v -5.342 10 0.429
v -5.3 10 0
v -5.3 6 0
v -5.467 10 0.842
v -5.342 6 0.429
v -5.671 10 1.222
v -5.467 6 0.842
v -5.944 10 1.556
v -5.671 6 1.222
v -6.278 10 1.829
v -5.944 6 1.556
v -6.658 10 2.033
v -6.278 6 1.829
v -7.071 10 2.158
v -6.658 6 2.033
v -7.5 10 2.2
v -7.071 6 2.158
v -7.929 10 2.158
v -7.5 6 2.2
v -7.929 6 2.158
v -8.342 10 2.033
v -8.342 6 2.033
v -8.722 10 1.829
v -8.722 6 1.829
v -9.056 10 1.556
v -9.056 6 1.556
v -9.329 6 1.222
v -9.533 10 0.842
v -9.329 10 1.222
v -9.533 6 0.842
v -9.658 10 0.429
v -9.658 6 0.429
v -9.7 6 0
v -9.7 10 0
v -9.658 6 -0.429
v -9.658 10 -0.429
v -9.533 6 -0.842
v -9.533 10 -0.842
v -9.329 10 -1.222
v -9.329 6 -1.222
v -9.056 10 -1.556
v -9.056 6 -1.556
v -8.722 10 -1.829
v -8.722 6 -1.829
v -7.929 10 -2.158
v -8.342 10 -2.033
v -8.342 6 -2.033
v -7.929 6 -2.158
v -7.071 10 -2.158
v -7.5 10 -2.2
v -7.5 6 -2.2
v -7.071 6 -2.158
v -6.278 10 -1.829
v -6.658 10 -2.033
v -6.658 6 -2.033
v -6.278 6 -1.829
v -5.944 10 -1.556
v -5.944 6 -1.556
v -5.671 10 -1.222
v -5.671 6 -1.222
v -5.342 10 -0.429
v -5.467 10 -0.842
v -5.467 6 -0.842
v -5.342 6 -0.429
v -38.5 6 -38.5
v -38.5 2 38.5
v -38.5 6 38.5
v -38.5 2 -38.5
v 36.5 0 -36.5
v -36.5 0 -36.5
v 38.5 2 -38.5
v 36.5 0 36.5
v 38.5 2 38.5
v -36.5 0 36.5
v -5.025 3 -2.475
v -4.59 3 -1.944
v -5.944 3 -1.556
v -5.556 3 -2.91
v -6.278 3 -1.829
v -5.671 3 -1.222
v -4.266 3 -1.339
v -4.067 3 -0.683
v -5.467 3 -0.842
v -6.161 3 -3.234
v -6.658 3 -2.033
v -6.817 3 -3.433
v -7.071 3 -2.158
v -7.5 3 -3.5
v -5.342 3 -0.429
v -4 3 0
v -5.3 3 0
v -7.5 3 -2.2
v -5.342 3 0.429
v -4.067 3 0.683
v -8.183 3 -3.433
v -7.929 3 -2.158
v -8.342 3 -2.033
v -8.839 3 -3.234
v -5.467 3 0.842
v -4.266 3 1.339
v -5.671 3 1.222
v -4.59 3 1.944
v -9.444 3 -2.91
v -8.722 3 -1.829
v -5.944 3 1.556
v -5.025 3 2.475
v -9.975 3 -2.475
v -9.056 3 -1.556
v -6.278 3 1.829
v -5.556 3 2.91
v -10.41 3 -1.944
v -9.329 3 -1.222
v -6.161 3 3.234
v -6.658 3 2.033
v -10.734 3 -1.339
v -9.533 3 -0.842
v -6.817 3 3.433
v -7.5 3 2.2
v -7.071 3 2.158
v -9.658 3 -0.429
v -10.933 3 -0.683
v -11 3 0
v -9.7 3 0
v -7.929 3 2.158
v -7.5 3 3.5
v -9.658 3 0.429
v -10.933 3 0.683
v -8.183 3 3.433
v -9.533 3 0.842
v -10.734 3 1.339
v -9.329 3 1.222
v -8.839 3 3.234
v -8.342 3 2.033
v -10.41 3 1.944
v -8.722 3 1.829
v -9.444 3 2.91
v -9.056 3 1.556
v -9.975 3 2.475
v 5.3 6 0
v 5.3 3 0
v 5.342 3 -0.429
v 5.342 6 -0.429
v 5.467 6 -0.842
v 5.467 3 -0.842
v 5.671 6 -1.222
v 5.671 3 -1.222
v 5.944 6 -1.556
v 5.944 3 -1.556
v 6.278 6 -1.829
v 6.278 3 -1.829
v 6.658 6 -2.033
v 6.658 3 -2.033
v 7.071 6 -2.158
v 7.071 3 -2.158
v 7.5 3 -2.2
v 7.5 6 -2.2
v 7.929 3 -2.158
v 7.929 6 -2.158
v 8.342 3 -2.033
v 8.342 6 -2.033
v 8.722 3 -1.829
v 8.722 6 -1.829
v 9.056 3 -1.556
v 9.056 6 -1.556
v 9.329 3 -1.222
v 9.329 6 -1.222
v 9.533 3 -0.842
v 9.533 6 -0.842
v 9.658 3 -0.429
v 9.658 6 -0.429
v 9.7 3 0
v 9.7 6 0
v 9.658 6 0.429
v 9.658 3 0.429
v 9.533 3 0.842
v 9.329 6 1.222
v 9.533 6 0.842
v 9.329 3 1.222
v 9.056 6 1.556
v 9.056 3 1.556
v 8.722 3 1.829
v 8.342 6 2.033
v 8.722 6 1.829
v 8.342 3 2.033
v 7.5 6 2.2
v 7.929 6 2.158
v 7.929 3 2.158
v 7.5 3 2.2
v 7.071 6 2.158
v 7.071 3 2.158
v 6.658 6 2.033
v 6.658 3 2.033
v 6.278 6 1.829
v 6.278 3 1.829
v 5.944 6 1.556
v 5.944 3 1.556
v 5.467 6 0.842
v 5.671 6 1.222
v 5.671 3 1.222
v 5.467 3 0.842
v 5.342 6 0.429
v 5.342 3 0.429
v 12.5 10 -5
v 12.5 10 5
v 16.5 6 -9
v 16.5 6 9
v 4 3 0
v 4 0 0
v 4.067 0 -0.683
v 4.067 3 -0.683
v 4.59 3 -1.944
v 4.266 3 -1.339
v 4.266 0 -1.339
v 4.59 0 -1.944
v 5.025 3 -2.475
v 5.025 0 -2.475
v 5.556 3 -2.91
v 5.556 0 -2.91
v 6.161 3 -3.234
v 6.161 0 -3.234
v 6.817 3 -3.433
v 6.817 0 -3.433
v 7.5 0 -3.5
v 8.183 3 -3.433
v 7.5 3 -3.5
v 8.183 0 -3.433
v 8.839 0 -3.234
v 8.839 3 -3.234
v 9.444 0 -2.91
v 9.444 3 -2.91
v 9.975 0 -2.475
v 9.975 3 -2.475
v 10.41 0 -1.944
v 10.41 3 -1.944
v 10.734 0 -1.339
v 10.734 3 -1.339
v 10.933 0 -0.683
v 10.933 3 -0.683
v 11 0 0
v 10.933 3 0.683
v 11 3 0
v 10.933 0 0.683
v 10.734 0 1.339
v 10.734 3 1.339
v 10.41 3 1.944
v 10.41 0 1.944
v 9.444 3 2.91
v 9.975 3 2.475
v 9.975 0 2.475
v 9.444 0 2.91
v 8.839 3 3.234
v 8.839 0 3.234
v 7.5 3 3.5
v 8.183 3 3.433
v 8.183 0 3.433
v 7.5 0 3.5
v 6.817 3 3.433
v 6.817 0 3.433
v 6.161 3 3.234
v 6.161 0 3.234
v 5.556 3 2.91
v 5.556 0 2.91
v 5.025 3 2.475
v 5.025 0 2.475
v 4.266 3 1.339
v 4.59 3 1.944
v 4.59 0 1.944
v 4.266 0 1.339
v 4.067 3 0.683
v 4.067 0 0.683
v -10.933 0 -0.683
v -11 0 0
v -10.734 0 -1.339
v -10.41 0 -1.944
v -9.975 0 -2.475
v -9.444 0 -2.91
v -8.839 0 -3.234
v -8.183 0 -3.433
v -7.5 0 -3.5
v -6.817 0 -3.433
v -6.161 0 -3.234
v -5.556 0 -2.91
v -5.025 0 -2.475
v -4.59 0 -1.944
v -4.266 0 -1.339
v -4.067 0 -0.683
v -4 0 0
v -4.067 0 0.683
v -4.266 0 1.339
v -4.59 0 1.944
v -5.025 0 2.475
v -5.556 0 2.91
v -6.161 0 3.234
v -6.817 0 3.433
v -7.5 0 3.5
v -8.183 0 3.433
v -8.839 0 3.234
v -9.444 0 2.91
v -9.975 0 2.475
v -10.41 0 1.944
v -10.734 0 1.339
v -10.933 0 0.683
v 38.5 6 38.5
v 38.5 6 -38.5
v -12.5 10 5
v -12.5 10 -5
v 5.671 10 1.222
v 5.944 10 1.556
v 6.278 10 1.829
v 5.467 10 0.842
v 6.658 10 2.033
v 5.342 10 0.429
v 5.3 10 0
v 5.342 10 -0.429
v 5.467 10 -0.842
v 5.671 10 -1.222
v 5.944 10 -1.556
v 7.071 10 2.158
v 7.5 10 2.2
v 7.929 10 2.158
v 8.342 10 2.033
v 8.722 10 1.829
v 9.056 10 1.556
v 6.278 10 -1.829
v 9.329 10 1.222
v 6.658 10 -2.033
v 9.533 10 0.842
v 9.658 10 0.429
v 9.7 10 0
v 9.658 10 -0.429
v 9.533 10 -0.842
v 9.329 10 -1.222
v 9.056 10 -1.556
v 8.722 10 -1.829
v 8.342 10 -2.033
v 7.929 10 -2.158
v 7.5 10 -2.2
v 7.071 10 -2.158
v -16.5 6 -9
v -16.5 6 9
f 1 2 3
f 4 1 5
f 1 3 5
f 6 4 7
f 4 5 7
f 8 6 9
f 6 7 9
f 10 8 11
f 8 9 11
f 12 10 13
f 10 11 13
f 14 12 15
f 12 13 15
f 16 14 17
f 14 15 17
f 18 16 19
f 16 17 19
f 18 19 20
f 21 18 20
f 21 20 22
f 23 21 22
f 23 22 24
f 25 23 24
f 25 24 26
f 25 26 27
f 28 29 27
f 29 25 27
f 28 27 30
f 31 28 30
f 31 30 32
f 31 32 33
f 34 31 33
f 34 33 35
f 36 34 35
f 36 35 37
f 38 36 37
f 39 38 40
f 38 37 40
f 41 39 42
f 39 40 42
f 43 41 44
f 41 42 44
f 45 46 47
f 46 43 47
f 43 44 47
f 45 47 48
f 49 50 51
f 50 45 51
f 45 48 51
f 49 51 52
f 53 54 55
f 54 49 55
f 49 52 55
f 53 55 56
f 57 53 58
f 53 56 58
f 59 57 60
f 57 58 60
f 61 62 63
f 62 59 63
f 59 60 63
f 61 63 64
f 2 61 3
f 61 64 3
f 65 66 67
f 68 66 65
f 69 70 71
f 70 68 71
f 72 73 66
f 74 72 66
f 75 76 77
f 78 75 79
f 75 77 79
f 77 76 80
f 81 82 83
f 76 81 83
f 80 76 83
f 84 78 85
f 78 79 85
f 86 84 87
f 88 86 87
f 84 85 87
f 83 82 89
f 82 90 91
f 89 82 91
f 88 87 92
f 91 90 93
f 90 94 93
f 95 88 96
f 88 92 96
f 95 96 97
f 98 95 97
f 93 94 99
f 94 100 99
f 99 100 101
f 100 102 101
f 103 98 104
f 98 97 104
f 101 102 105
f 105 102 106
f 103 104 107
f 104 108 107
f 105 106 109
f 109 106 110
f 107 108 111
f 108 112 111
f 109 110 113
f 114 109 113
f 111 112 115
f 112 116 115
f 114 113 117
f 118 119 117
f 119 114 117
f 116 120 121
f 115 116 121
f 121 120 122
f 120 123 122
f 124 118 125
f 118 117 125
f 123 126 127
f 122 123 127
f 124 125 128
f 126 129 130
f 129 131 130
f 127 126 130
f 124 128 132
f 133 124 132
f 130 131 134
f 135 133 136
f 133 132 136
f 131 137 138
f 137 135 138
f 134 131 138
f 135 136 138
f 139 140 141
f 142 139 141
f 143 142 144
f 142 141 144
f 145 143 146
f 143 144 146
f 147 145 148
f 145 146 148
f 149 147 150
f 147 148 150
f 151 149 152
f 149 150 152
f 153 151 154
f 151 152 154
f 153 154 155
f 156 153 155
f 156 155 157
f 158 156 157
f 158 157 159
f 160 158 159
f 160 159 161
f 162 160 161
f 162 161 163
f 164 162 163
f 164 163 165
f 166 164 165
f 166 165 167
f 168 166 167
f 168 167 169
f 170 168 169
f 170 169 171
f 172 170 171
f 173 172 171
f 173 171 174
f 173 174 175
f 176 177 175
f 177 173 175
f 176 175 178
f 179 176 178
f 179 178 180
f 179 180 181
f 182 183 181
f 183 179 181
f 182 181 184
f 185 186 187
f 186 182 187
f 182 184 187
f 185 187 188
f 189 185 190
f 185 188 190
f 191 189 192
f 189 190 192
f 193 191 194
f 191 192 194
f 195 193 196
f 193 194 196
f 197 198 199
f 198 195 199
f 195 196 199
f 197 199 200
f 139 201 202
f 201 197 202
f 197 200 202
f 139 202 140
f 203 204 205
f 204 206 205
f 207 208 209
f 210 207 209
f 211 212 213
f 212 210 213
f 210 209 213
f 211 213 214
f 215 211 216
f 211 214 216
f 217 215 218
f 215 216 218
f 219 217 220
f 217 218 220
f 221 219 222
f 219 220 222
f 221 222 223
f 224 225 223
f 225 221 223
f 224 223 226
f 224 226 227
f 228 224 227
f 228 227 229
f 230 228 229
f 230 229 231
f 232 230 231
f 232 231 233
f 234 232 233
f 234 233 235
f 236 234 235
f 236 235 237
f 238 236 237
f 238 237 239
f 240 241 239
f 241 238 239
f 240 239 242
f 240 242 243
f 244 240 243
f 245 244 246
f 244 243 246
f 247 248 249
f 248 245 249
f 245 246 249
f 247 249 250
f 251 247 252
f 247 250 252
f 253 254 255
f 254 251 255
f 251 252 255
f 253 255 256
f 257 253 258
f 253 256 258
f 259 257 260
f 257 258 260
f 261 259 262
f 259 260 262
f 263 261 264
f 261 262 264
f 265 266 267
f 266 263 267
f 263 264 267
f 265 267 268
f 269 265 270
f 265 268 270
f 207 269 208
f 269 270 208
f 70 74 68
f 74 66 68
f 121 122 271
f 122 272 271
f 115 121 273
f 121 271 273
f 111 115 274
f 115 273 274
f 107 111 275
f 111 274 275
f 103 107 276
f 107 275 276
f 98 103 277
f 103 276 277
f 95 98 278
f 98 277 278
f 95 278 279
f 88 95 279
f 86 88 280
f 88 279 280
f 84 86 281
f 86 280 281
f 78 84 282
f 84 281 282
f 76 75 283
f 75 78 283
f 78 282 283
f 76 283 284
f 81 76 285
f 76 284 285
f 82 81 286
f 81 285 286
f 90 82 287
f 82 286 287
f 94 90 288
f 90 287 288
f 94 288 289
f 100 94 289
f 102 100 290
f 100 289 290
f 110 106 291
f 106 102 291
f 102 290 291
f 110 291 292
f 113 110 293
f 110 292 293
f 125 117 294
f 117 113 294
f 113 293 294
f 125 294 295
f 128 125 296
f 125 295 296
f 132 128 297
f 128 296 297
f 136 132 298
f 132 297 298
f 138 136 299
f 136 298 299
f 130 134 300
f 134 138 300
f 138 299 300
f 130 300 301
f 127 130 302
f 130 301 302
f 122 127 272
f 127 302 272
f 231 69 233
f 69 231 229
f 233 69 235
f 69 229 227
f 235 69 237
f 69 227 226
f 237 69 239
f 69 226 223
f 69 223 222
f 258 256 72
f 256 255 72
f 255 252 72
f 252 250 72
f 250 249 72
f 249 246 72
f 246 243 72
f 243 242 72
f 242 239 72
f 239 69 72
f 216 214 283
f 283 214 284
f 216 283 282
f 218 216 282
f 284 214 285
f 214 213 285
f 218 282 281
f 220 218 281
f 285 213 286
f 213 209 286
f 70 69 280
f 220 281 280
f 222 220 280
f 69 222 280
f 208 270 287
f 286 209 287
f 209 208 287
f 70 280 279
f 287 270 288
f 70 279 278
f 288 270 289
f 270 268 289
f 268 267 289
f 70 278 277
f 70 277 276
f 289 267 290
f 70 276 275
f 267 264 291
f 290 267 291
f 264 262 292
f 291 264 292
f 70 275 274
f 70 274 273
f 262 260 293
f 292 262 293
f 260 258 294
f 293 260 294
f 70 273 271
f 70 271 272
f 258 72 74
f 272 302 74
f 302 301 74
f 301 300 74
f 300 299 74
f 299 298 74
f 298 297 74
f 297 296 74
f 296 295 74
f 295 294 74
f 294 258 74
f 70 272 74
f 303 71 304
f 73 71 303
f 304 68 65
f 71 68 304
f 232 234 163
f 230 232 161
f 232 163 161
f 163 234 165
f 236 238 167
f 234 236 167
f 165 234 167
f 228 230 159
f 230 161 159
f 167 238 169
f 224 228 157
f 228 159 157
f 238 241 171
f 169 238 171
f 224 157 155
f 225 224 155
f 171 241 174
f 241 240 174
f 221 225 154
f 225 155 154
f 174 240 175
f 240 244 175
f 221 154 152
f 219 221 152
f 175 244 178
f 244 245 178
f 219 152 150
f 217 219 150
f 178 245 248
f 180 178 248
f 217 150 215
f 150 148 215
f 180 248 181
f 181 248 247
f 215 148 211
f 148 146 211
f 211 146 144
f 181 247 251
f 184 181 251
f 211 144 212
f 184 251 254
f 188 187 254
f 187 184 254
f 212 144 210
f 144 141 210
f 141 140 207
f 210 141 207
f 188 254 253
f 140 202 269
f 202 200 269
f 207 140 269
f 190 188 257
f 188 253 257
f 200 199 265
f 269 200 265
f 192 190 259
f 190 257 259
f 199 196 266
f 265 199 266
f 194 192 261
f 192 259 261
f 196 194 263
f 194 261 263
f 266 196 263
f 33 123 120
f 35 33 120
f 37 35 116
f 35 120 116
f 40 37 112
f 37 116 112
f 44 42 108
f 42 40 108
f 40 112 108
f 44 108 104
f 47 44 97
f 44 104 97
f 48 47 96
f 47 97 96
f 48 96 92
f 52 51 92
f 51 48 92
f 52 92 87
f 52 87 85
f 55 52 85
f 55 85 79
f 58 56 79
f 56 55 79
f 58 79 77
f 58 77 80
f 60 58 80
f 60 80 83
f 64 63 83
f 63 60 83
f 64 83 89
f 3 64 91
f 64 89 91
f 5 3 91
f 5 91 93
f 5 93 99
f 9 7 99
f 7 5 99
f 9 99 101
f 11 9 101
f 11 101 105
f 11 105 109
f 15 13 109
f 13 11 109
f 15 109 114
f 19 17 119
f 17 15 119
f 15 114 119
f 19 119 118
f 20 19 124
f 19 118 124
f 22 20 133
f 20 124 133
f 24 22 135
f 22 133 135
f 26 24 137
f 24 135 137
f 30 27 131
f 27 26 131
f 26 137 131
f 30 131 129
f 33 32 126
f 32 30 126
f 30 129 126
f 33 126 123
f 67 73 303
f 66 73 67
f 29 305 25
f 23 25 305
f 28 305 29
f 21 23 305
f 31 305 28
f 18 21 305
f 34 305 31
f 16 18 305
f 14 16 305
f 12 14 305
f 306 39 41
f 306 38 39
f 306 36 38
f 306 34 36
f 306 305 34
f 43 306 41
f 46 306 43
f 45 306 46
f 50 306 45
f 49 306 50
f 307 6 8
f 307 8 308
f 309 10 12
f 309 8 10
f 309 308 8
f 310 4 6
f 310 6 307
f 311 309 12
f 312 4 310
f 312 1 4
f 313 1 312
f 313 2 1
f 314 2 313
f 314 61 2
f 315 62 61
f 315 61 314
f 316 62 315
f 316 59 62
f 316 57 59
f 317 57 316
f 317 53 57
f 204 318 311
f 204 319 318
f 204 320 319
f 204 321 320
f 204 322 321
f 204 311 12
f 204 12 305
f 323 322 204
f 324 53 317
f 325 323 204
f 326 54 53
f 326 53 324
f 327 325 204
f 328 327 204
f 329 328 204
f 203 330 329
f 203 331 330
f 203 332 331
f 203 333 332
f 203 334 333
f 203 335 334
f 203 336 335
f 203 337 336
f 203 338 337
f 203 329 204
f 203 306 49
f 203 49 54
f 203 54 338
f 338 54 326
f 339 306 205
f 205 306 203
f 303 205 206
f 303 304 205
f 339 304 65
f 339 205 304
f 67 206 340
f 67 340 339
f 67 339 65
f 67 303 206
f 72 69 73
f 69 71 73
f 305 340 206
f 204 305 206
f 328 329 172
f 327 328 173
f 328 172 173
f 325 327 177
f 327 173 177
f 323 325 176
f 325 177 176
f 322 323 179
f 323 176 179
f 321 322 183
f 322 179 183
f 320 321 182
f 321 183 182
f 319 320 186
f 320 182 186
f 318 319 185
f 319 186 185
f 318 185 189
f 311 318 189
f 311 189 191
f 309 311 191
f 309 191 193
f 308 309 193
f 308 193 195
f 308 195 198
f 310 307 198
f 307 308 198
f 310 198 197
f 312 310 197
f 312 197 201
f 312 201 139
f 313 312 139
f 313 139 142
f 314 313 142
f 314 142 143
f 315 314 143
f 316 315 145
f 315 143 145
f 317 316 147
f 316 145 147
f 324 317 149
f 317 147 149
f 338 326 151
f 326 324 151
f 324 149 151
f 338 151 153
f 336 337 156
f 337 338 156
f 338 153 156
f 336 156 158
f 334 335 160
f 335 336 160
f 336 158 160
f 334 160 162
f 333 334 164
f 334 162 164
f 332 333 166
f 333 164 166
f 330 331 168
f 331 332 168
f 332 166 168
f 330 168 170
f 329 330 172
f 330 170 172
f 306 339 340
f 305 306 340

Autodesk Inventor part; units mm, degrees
ref_plane "YZ Plane" through (0, 0, 0) normal (1, 0, 0) x (0, 1, 0)
ref_plane "XZ Plane" through (0, 0, 0) normal (0, 1, 0) x (-1, 0, 0)
ref_plane "XY Plane" through (0, 0, 0) normal (0, 0, 1) x (1, 0, 0)
sketch "Szkic1" plane through (0, 0, 0) normal (0, 1, 0) x (-1, 0, 0)
  line L0 (0, 0) -> (7.5, 0)
  line L1 (0, 0) -> (7.5, 0) construction
  circle A0 centre (7.5, 0) radius 2.2
  line L2 (0, 0) -> (0, -2)
  circle A1 centre (-7.5, 0) radius 2.2
  line L3 (-38.5, 38.5) -> (38.5, 38.5)
  line L4 (38.5, 38.5) -> (38.5, -38.5)
  line L5 (38.5, -38.5) -> (-38.5, -38.5)
  line L6 (-38.5, -38.5) -> (-38.5, 38.5)
  line L7 (-38.5, 38.5) -> (38.5, -38.5) construction
  line L8 (38.5, 38.5) -> (-38.5, -38.5) construction
  circle A2 centre (7.5, 0) radius 3.5
  circle A3 centre (-7.5, 0) radius 3.5
  dimension "d0" = 7.5
  dimension "d1" = 0
  dimension "d2" = 4.4
  dimension "d3" = 2
  dimension "d4" = 77
  dimension "d5" = 77
  dimension "d8" = 7
extrude "Wyciągnięcie proste1" add sketch "Szkic1" along normal blind 6 contours A2 | L3 L4 L5 L6 | A3
extrude "Wyciągnięcie proste2" cut sketch "Szkic1" along normal blind 3 contours A2 | A3
chamfer "Faza1" distance 2 angle 45 4 edges at (-38.5, 0, 0) (0, 0, -38.5) (38.5, 0, 0) (0, 0, 38.5)
sketch "Szkic2" plane through (0, 6, 0) normal (0, 1, 0) x (1, 0, 0)
  line L0 (12.5, -5) -> (-12.5, -5)
  line L1 (-12.5, -5) -> (-12.5, 5)
  line L2 (-12.5, 5) -> (12.5, 5)
  line L3 (12.5, 5) -> (12.5, -5)
  line L4 (12.5, -5) -> (-12.5, 5) construction
  line L5 (-12.5, -5) -> (12.5, 5) construction
  circle A0 centre (-7.5, 0) radius 2.2 projected
  circle A1 centre (-7.5, 0) radius 2.2
  circle A2 centre (7.5, 0) radius 2.2 projected
  circle A3 centre (7.5, 0) radius 2.2
  point P0 (0, 0)
  dimension "d14" = 25
  dimension "d15" = 10
extrude "Wyciągnięcie proste3" add sketch "Szkic2" along normal blind 4
chamfer "Faza2" distance 4 angle 45 4 edges at (0, 6, 5) (12.5, 6, 0) (0, 6, -5) (-12.5, 6, 0)
properties part number "taca"
